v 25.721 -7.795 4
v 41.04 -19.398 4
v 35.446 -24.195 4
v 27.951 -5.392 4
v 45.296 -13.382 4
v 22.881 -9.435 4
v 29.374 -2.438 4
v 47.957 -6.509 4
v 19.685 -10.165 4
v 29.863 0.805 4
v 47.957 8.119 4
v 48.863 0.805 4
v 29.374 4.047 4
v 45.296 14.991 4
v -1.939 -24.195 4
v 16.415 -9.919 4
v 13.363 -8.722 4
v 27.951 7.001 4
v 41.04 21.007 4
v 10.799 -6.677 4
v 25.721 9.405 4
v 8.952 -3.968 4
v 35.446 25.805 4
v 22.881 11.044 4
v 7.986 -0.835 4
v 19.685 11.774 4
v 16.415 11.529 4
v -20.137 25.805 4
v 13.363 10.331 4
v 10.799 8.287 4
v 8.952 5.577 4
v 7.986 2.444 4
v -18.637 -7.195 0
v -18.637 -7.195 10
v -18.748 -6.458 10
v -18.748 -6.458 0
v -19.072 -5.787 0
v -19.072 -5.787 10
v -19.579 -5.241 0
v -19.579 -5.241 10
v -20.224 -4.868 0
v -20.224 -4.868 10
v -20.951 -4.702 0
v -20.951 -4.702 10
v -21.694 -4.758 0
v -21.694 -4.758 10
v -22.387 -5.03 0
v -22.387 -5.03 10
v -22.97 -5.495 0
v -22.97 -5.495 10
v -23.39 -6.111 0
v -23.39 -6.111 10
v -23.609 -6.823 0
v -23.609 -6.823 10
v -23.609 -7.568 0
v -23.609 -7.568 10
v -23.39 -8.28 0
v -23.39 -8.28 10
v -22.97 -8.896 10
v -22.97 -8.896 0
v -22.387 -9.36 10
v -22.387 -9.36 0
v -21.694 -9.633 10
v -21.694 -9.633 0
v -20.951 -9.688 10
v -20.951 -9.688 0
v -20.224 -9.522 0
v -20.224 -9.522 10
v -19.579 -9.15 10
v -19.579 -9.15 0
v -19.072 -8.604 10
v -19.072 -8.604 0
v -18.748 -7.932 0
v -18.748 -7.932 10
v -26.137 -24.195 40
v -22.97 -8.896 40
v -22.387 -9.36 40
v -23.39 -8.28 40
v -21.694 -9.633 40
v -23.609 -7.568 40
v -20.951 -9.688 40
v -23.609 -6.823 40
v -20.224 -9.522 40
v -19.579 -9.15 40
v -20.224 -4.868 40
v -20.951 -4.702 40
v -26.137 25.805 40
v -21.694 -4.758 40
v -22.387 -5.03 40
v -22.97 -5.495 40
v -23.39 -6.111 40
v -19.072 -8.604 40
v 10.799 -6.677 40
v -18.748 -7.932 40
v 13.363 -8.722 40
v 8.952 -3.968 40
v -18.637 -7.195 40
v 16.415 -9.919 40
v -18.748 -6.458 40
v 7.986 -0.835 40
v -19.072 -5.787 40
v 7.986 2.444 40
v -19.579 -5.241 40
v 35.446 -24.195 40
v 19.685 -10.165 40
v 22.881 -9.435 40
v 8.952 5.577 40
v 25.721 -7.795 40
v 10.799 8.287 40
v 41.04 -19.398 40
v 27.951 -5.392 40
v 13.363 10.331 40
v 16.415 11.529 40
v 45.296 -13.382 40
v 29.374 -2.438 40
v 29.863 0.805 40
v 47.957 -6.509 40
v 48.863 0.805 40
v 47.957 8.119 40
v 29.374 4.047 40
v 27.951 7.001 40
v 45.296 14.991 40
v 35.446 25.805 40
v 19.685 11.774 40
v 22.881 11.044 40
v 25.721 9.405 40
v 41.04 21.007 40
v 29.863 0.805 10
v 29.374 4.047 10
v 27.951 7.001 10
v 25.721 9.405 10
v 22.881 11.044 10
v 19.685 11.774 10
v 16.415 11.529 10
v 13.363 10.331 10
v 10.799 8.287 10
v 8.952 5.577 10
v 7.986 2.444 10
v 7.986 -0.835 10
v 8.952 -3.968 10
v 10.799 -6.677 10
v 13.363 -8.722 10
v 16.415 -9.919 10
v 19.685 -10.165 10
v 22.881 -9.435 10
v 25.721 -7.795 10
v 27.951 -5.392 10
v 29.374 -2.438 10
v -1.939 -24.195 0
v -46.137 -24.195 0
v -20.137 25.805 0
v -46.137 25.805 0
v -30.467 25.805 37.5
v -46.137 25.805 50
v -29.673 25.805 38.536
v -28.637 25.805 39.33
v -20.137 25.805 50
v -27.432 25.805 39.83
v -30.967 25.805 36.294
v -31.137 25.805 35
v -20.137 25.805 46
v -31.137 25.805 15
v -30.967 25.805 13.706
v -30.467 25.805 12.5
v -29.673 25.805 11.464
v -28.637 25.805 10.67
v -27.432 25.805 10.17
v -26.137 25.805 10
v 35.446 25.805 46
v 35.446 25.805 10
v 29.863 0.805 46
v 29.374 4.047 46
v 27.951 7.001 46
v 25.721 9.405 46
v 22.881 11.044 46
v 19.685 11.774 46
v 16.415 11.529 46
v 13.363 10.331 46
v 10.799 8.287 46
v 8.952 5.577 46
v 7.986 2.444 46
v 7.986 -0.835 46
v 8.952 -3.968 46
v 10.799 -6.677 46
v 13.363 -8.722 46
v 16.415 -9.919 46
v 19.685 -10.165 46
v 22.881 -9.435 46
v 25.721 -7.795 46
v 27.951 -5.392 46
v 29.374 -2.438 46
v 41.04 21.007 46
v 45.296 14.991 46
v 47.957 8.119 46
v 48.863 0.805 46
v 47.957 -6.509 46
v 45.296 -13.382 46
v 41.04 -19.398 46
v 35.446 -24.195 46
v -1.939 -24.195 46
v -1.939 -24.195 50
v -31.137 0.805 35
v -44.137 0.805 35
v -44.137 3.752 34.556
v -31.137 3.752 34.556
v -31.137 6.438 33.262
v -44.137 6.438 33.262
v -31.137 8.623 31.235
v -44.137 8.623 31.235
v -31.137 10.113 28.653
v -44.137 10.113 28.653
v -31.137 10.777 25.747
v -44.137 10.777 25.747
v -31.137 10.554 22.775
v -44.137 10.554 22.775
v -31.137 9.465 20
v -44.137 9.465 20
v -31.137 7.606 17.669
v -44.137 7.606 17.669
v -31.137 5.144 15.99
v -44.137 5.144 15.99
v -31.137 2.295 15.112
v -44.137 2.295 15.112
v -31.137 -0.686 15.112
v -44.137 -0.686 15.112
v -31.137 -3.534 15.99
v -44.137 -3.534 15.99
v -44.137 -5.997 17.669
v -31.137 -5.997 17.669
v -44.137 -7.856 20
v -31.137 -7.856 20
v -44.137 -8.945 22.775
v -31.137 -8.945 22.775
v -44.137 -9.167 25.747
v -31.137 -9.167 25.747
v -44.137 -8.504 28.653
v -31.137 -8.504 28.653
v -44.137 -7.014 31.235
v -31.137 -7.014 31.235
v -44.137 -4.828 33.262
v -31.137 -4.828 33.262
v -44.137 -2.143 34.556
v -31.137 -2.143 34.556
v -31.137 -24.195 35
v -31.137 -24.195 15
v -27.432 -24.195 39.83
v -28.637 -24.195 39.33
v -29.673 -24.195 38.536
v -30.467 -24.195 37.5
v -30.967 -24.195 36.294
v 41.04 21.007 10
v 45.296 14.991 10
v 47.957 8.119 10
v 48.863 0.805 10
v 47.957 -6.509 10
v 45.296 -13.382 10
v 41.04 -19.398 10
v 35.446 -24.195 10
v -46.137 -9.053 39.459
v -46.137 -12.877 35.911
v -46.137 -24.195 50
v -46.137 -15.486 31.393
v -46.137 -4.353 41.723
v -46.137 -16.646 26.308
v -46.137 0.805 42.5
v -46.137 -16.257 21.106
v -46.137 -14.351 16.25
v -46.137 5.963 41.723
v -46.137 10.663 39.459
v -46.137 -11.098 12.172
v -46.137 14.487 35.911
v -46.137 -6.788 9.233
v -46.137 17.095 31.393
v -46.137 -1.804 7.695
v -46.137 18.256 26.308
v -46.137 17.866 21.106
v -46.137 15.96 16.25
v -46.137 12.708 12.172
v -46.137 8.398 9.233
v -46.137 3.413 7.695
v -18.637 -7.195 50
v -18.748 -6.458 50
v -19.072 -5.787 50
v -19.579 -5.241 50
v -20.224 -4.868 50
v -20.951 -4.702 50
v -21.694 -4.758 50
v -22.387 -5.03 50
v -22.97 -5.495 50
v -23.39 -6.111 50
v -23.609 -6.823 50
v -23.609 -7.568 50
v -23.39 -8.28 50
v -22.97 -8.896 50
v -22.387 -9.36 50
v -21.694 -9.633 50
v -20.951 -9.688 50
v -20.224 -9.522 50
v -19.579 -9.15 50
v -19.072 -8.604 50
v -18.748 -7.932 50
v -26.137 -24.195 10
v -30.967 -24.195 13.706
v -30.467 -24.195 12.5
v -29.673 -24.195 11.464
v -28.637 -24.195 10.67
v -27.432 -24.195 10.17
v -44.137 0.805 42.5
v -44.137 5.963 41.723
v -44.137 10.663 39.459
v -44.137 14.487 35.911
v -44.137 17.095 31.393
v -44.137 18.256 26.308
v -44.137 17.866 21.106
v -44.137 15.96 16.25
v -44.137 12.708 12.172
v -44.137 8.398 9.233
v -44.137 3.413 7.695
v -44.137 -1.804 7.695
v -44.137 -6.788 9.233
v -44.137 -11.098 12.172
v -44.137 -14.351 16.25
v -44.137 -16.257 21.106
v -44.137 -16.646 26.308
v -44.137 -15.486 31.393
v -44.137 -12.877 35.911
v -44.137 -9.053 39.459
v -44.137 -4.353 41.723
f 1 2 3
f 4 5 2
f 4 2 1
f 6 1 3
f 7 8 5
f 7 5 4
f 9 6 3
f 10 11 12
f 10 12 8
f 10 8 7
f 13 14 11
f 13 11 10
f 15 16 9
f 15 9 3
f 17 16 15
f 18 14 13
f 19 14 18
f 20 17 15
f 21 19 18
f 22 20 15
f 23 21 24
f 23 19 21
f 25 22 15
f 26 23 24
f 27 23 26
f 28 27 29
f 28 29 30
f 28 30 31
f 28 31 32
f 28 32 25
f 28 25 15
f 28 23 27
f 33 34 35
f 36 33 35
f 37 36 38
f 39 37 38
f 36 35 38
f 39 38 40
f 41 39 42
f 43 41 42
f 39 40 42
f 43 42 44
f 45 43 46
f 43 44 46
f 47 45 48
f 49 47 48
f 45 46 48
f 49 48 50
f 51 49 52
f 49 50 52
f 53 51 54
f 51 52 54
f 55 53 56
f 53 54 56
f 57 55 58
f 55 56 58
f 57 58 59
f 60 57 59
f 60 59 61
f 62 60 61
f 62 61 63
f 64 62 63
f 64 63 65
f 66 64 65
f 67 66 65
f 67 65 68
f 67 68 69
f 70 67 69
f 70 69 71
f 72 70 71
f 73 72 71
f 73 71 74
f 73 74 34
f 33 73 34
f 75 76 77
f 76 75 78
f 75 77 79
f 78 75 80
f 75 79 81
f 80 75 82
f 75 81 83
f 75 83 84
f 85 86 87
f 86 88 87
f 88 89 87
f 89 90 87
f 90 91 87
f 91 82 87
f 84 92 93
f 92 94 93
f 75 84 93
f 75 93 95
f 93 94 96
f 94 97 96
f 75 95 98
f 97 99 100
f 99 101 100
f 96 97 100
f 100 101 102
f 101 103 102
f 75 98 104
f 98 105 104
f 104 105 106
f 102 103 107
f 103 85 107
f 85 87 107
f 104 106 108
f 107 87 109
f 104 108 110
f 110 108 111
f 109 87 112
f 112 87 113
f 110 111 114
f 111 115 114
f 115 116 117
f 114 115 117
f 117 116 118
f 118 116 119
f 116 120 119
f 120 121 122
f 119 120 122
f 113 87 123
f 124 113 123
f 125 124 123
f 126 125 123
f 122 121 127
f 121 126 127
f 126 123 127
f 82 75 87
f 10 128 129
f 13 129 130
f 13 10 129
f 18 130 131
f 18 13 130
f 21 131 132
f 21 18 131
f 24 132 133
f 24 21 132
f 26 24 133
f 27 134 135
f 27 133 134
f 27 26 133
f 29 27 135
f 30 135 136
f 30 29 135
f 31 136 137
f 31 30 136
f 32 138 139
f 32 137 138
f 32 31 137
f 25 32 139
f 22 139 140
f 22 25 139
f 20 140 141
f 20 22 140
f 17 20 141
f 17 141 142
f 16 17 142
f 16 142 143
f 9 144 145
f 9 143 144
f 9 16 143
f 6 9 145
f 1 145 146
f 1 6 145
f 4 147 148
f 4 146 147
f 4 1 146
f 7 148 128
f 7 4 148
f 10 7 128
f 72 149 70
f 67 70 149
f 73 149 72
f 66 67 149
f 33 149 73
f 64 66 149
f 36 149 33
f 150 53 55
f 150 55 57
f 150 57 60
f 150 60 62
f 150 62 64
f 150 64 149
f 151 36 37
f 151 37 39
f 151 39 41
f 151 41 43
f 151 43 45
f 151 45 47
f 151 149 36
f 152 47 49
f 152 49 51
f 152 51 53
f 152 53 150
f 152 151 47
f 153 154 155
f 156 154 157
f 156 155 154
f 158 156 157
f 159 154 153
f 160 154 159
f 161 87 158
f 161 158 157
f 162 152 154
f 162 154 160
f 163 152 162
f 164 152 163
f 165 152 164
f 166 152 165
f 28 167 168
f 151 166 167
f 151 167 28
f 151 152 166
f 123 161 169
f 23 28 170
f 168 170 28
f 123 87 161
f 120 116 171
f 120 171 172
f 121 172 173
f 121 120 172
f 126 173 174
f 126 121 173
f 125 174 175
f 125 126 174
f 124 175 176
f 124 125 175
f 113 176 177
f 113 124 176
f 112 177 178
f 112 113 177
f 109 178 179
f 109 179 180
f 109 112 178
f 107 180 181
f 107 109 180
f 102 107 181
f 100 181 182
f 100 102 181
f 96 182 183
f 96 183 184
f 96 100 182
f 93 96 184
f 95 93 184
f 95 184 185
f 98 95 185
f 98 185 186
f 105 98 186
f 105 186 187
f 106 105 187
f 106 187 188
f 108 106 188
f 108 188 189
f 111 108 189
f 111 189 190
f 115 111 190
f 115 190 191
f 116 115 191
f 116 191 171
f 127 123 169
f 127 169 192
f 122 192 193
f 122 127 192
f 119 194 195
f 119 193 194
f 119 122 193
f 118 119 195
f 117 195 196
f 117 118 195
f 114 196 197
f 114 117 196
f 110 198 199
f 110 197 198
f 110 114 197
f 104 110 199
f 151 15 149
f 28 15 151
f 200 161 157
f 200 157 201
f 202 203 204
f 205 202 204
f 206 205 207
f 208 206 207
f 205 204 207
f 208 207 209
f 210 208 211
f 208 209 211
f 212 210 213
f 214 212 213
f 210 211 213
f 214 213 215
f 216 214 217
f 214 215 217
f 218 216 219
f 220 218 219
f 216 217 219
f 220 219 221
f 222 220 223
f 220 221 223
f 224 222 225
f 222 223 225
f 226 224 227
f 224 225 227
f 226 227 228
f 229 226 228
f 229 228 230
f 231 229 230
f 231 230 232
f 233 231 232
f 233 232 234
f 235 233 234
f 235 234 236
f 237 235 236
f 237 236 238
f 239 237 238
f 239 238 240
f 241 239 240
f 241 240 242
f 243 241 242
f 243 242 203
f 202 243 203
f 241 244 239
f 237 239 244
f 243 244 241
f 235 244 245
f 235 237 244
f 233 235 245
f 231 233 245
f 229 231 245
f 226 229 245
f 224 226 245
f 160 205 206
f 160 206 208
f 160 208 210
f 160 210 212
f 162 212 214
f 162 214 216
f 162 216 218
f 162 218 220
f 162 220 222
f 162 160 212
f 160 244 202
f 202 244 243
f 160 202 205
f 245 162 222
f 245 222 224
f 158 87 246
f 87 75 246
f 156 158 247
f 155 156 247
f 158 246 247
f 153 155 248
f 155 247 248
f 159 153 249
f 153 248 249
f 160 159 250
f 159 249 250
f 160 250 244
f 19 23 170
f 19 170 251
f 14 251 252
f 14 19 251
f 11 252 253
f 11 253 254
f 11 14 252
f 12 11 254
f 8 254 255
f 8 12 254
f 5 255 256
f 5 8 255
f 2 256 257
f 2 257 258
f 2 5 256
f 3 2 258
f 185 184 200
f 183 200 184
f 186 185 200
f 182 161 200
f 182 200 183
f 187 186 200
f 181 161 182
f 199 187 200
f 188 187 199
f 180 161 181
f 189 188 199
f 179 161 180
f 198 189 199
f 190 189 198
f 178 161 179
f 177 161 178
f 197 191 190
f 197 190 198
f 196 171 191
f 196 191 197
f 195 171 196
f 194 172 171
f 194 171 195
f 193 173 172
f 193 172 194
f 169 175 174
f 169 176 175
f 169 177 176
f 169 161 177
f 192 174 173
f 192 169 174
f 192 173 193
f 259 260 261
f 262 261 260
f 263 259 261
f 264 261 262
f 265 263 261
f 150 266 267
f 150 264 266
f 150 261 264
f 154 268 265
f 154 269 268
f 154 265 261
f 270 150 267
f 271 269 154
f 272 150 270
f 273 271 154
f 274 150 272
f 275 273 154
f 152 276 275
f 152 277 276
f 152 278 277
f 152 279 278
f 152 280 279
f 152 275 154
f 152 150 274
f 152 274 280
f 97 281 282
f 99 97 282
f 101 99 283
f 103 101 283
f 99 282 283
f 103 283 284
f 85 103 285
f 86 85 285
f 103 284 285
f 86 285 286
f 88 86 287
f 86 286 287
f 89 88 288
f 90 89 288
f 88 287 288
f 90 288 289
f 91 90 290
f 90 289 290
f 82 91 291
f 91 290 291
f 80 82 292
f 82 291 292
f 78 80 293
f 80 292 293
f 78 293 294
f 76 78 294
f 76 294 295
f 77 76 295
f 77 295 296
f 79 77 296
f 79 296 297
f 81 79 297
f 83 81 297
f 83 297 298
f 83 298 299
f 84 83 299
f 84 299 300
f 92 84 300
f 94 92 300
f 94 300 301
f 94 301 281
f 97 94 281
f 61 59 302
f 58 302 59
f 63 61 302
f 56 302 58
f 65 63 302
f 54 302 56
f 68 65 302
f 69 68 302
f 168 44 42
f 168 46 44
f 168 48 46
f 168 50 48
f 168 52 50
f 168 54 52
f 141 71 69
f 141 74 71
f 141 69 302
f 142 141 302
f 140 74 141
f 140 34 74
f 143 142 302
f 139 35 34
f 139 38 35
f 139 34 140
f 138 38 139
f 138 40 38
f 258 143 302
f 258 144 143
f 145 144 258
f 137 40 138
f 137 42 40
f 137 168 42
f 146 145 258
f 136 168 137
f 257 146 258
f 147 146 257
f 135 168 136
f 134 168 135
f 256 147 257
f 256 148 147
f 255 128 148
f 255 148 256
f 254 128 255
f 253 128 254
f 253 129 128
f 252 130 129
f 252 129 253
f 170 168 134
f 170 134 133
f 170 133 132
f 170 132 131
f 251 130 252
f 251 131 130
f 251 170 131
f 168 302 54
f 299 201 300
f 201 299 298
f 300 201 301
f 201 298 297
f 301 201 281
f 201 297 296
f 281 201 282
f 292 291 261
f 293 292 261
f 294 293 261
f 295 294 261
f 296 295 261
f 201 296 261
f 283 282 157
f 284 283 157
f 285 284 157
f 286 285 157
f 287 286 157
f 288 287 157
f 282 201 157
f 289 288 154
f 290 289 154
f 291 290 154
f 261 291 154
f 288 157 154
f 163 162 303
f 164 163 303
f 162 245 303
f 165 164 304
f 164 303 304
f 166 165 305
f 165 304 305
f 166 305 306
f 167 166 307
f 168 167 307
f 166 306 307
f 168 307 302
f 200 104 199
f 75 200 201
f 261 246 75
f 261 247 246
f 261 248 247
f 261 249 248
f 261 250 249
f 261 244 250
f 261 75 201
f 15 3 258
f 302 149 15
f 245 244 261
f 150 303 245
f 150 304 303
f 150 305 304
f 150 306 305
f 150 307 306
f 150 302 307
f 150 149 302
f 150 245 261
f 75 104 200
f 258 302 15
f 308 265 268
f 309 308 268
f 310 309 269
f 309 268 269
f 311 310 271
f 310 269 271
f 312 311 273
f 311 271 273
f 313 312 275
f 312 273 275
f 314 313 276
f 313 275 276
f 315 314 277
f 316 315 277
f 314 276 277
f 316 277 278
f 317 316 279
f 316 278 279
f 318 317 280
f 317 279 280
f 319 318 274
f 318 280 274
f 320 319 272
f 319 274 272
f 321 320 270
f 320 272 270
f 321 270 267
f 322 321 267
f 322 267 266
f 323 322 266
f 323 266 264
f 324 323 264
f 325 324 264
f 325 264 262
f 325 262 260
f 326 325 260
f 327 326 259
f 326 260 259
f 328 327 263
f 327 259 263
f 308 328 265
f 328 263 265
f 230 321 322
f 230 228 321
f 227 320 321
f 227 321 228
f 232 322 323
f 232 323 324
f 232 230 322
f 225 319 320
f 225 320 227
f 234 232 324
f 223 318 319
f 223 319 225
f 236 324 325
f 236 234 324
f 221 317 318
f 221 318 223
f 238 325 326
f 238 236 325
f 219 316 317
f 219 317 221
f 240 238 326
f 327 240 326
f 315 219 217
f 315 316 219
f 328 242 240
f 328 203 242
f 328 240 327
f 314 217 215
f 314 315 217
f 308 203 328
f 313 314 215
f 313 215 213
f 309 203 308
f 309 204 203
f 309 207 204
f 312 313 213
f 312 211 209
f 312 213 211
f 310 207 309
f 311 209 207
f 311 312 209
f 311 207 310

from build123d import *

# Parameters (mm, degrees)
SKETCH1_R               = 11
BOSS_EXTRUDE1_DEPTH     = 50
SKETCH2_R               = 17.5
CUT_EXTRUDE1_DEPTH      = 2
SKETCH3_R               = 10
CUT_EXTRUDE2_DEPTH      = 109.696290771
CUT_EXTRUDE3_DEPTH      = 75.521428374
CUT_EXTRUDE3_DEPTH_BACK = 4
SKETCH4_R               = 11
CUT_EXTRUDE4_DEPTH      = 75.521428307
CUT_EXTRUDE4_DEPTH_BACK = 4
SKETCH5_R               = 11
SKETCH6_W               = 90
SKETCH6_H               = 30
CUT_EXTRUDE5_DEPTH      = 86.950914215
SKETCH7_R               = 2.5
CUT_EXTRUDE6_DEPTH      = 75.521428207
FILLET2_R               = 5


with BuildPart() as part:
    # Sketch1 → Boss-Extrude1 (new body)
    with BuildSketch(Plane.XY):
        with BuildLine():
            Line((35.445784896, -24.19527897), (-46.137339056, -24.19527897))
            Line((-46.137339056, -24.19527897), (-46.137339056, 25.80472103))
            Line((-46.137339056, 25.80472103), (35.445784896, 25.80472103))
            ThreePointArc((35.445784896, 25.80472103), (48.862660944, 0.80472103), (35.445784896, -24.19527897))
        make_face()
        with Locations((18.862660944, 0.80472103)):
            Circle(SKETCH1_R, mode=Mode.SUBTRACT)
    extrude(amount=BOSS_EXTRUDE1_DEPTH)

    # Sketch2 → Cut-Extrude1 (cut)
    with BuildSketch(Plane.ZY.offset(46.137339056)):
        with Locations((25, 0.80472103)):
            Circle(SKETCH2_R)
    extrude(amount=-CUT_EXTRUDE1_DEPTH, mode=Mode.SUBTRACT)

    # Sketch3 → Cut-Extrude2 (cut, through all)
    with BuildSketch(Plane.ZY.offset(44.137339056)):
        with Locations((25, 0.80472103)):
            Circle(SKETCH3_R)
    extrude(amount=-CUT_EXTRUDE2_DEPTH, mode=Mode.SUBTRACT)

    # Sketch4 → Cut-Extrude3 (cut, two sides: drawn at the far end of the back side and taken through both)
    with BuildSketch(Plane.XY.offset(50).offset(-CUT_EXTRUDE3_DEPTH_BACK)):
        with BuildLine():
            Line((35.445784896, 25.80472103), (-20.137339056, 25.80472103))
            Line((-20.137339056, 25.80472103), (-1.938827342, -24.19527897))
            Line((-1.938827342, -24.19527897), (35.445784896, -24.19527897))
            ThreePointArc((35.445784896, -24.19527897), (48.862660944, 0.80472103), (35.445784896, 25.80472103))
        make_face()
        with Locations((18.862660944, 0.80472103)):
            Circle(SKETCH4_R, mode=Mode.SUBTRACT)
    extrude(amount=CUT_EXTRUDE3_DEPTH + CUT_EXTRUDE3_DEPTH_BACK, mode=Mode.SUBTRACT)

    # Sketch5 → Cut-Extrude4 (cut, two sides: drawn at the far end of the back side and taken through both)
    with BuildSketch(Plane(origin=(0, 0, 0), x_dir=(-1, 0, 0), z_dir=(0, 0, -1)).offset(-CUT_EXTRUDE4_DEPTH_BACK)):
        with BuildLine():
            Line((1.938827342, -24.19527897), (20.137339056, 25.80472103))
            Line((20.137339056, 25.80472103), (-35.445784896, 25.80472103))
            ThreePointArc((-35.445784896, 25.80472103), (-48.862660944, 0.80472103), (-35.445784896, -24.19527897))
            Line((-35.445784896, -24.19527897), (1.938827342, -24.19527897))
        make_face()
        with Locations((-18.862660944, 0.80472103)):
            Circle(SKETCH5_R, mode=Mode.SUBTRACT)
    extrude(amount=CUT_EXTRUDE4_DEPTH + CUT_EXTRUDE4_DEPTH_BACK, mode=Mode.SUBTRACT)

    # Sketch6 → Cut-Extrude5 (cut, through all)
    with BuildSketch(Plane(origin=(0, 25.80472103, 0), x_dir=(1, 0, 0), z_dir=(0, 1, 0))):
        with Locations((13.862660944, -25)):
            Rectangle(SKETCH6_W, SKETCH6_H)
    extrude(amount=-CUT_EXTRUDE5_DEPTH, mode=Mode.SUBTRACT)

    # Sketch7 → Cut-Extrude6 (cut, through all)
    with BuildSketch(Plane.XY.offset(50)):
        with Locations((-21.137339056, -7.19527897)):
            Circle(SKETCH7_R)
    extrude(amount=-CUT_EXTRUDE6_DEPTH, mode=Mode.SUBTRACT)

    # Fillet2
    fillet2_edges = [part.edges().sort_by_distance(p)[0] for p in [
        (-31.137339056, 0.80472103, 10),
        (-31.137339056, 0.80472103, 40),
    ]]
    fillet(fillet2_edges, radius=FILLET2_R - 0.0001)  # a hair under: the kernel refuses the full size


solid = part.part
